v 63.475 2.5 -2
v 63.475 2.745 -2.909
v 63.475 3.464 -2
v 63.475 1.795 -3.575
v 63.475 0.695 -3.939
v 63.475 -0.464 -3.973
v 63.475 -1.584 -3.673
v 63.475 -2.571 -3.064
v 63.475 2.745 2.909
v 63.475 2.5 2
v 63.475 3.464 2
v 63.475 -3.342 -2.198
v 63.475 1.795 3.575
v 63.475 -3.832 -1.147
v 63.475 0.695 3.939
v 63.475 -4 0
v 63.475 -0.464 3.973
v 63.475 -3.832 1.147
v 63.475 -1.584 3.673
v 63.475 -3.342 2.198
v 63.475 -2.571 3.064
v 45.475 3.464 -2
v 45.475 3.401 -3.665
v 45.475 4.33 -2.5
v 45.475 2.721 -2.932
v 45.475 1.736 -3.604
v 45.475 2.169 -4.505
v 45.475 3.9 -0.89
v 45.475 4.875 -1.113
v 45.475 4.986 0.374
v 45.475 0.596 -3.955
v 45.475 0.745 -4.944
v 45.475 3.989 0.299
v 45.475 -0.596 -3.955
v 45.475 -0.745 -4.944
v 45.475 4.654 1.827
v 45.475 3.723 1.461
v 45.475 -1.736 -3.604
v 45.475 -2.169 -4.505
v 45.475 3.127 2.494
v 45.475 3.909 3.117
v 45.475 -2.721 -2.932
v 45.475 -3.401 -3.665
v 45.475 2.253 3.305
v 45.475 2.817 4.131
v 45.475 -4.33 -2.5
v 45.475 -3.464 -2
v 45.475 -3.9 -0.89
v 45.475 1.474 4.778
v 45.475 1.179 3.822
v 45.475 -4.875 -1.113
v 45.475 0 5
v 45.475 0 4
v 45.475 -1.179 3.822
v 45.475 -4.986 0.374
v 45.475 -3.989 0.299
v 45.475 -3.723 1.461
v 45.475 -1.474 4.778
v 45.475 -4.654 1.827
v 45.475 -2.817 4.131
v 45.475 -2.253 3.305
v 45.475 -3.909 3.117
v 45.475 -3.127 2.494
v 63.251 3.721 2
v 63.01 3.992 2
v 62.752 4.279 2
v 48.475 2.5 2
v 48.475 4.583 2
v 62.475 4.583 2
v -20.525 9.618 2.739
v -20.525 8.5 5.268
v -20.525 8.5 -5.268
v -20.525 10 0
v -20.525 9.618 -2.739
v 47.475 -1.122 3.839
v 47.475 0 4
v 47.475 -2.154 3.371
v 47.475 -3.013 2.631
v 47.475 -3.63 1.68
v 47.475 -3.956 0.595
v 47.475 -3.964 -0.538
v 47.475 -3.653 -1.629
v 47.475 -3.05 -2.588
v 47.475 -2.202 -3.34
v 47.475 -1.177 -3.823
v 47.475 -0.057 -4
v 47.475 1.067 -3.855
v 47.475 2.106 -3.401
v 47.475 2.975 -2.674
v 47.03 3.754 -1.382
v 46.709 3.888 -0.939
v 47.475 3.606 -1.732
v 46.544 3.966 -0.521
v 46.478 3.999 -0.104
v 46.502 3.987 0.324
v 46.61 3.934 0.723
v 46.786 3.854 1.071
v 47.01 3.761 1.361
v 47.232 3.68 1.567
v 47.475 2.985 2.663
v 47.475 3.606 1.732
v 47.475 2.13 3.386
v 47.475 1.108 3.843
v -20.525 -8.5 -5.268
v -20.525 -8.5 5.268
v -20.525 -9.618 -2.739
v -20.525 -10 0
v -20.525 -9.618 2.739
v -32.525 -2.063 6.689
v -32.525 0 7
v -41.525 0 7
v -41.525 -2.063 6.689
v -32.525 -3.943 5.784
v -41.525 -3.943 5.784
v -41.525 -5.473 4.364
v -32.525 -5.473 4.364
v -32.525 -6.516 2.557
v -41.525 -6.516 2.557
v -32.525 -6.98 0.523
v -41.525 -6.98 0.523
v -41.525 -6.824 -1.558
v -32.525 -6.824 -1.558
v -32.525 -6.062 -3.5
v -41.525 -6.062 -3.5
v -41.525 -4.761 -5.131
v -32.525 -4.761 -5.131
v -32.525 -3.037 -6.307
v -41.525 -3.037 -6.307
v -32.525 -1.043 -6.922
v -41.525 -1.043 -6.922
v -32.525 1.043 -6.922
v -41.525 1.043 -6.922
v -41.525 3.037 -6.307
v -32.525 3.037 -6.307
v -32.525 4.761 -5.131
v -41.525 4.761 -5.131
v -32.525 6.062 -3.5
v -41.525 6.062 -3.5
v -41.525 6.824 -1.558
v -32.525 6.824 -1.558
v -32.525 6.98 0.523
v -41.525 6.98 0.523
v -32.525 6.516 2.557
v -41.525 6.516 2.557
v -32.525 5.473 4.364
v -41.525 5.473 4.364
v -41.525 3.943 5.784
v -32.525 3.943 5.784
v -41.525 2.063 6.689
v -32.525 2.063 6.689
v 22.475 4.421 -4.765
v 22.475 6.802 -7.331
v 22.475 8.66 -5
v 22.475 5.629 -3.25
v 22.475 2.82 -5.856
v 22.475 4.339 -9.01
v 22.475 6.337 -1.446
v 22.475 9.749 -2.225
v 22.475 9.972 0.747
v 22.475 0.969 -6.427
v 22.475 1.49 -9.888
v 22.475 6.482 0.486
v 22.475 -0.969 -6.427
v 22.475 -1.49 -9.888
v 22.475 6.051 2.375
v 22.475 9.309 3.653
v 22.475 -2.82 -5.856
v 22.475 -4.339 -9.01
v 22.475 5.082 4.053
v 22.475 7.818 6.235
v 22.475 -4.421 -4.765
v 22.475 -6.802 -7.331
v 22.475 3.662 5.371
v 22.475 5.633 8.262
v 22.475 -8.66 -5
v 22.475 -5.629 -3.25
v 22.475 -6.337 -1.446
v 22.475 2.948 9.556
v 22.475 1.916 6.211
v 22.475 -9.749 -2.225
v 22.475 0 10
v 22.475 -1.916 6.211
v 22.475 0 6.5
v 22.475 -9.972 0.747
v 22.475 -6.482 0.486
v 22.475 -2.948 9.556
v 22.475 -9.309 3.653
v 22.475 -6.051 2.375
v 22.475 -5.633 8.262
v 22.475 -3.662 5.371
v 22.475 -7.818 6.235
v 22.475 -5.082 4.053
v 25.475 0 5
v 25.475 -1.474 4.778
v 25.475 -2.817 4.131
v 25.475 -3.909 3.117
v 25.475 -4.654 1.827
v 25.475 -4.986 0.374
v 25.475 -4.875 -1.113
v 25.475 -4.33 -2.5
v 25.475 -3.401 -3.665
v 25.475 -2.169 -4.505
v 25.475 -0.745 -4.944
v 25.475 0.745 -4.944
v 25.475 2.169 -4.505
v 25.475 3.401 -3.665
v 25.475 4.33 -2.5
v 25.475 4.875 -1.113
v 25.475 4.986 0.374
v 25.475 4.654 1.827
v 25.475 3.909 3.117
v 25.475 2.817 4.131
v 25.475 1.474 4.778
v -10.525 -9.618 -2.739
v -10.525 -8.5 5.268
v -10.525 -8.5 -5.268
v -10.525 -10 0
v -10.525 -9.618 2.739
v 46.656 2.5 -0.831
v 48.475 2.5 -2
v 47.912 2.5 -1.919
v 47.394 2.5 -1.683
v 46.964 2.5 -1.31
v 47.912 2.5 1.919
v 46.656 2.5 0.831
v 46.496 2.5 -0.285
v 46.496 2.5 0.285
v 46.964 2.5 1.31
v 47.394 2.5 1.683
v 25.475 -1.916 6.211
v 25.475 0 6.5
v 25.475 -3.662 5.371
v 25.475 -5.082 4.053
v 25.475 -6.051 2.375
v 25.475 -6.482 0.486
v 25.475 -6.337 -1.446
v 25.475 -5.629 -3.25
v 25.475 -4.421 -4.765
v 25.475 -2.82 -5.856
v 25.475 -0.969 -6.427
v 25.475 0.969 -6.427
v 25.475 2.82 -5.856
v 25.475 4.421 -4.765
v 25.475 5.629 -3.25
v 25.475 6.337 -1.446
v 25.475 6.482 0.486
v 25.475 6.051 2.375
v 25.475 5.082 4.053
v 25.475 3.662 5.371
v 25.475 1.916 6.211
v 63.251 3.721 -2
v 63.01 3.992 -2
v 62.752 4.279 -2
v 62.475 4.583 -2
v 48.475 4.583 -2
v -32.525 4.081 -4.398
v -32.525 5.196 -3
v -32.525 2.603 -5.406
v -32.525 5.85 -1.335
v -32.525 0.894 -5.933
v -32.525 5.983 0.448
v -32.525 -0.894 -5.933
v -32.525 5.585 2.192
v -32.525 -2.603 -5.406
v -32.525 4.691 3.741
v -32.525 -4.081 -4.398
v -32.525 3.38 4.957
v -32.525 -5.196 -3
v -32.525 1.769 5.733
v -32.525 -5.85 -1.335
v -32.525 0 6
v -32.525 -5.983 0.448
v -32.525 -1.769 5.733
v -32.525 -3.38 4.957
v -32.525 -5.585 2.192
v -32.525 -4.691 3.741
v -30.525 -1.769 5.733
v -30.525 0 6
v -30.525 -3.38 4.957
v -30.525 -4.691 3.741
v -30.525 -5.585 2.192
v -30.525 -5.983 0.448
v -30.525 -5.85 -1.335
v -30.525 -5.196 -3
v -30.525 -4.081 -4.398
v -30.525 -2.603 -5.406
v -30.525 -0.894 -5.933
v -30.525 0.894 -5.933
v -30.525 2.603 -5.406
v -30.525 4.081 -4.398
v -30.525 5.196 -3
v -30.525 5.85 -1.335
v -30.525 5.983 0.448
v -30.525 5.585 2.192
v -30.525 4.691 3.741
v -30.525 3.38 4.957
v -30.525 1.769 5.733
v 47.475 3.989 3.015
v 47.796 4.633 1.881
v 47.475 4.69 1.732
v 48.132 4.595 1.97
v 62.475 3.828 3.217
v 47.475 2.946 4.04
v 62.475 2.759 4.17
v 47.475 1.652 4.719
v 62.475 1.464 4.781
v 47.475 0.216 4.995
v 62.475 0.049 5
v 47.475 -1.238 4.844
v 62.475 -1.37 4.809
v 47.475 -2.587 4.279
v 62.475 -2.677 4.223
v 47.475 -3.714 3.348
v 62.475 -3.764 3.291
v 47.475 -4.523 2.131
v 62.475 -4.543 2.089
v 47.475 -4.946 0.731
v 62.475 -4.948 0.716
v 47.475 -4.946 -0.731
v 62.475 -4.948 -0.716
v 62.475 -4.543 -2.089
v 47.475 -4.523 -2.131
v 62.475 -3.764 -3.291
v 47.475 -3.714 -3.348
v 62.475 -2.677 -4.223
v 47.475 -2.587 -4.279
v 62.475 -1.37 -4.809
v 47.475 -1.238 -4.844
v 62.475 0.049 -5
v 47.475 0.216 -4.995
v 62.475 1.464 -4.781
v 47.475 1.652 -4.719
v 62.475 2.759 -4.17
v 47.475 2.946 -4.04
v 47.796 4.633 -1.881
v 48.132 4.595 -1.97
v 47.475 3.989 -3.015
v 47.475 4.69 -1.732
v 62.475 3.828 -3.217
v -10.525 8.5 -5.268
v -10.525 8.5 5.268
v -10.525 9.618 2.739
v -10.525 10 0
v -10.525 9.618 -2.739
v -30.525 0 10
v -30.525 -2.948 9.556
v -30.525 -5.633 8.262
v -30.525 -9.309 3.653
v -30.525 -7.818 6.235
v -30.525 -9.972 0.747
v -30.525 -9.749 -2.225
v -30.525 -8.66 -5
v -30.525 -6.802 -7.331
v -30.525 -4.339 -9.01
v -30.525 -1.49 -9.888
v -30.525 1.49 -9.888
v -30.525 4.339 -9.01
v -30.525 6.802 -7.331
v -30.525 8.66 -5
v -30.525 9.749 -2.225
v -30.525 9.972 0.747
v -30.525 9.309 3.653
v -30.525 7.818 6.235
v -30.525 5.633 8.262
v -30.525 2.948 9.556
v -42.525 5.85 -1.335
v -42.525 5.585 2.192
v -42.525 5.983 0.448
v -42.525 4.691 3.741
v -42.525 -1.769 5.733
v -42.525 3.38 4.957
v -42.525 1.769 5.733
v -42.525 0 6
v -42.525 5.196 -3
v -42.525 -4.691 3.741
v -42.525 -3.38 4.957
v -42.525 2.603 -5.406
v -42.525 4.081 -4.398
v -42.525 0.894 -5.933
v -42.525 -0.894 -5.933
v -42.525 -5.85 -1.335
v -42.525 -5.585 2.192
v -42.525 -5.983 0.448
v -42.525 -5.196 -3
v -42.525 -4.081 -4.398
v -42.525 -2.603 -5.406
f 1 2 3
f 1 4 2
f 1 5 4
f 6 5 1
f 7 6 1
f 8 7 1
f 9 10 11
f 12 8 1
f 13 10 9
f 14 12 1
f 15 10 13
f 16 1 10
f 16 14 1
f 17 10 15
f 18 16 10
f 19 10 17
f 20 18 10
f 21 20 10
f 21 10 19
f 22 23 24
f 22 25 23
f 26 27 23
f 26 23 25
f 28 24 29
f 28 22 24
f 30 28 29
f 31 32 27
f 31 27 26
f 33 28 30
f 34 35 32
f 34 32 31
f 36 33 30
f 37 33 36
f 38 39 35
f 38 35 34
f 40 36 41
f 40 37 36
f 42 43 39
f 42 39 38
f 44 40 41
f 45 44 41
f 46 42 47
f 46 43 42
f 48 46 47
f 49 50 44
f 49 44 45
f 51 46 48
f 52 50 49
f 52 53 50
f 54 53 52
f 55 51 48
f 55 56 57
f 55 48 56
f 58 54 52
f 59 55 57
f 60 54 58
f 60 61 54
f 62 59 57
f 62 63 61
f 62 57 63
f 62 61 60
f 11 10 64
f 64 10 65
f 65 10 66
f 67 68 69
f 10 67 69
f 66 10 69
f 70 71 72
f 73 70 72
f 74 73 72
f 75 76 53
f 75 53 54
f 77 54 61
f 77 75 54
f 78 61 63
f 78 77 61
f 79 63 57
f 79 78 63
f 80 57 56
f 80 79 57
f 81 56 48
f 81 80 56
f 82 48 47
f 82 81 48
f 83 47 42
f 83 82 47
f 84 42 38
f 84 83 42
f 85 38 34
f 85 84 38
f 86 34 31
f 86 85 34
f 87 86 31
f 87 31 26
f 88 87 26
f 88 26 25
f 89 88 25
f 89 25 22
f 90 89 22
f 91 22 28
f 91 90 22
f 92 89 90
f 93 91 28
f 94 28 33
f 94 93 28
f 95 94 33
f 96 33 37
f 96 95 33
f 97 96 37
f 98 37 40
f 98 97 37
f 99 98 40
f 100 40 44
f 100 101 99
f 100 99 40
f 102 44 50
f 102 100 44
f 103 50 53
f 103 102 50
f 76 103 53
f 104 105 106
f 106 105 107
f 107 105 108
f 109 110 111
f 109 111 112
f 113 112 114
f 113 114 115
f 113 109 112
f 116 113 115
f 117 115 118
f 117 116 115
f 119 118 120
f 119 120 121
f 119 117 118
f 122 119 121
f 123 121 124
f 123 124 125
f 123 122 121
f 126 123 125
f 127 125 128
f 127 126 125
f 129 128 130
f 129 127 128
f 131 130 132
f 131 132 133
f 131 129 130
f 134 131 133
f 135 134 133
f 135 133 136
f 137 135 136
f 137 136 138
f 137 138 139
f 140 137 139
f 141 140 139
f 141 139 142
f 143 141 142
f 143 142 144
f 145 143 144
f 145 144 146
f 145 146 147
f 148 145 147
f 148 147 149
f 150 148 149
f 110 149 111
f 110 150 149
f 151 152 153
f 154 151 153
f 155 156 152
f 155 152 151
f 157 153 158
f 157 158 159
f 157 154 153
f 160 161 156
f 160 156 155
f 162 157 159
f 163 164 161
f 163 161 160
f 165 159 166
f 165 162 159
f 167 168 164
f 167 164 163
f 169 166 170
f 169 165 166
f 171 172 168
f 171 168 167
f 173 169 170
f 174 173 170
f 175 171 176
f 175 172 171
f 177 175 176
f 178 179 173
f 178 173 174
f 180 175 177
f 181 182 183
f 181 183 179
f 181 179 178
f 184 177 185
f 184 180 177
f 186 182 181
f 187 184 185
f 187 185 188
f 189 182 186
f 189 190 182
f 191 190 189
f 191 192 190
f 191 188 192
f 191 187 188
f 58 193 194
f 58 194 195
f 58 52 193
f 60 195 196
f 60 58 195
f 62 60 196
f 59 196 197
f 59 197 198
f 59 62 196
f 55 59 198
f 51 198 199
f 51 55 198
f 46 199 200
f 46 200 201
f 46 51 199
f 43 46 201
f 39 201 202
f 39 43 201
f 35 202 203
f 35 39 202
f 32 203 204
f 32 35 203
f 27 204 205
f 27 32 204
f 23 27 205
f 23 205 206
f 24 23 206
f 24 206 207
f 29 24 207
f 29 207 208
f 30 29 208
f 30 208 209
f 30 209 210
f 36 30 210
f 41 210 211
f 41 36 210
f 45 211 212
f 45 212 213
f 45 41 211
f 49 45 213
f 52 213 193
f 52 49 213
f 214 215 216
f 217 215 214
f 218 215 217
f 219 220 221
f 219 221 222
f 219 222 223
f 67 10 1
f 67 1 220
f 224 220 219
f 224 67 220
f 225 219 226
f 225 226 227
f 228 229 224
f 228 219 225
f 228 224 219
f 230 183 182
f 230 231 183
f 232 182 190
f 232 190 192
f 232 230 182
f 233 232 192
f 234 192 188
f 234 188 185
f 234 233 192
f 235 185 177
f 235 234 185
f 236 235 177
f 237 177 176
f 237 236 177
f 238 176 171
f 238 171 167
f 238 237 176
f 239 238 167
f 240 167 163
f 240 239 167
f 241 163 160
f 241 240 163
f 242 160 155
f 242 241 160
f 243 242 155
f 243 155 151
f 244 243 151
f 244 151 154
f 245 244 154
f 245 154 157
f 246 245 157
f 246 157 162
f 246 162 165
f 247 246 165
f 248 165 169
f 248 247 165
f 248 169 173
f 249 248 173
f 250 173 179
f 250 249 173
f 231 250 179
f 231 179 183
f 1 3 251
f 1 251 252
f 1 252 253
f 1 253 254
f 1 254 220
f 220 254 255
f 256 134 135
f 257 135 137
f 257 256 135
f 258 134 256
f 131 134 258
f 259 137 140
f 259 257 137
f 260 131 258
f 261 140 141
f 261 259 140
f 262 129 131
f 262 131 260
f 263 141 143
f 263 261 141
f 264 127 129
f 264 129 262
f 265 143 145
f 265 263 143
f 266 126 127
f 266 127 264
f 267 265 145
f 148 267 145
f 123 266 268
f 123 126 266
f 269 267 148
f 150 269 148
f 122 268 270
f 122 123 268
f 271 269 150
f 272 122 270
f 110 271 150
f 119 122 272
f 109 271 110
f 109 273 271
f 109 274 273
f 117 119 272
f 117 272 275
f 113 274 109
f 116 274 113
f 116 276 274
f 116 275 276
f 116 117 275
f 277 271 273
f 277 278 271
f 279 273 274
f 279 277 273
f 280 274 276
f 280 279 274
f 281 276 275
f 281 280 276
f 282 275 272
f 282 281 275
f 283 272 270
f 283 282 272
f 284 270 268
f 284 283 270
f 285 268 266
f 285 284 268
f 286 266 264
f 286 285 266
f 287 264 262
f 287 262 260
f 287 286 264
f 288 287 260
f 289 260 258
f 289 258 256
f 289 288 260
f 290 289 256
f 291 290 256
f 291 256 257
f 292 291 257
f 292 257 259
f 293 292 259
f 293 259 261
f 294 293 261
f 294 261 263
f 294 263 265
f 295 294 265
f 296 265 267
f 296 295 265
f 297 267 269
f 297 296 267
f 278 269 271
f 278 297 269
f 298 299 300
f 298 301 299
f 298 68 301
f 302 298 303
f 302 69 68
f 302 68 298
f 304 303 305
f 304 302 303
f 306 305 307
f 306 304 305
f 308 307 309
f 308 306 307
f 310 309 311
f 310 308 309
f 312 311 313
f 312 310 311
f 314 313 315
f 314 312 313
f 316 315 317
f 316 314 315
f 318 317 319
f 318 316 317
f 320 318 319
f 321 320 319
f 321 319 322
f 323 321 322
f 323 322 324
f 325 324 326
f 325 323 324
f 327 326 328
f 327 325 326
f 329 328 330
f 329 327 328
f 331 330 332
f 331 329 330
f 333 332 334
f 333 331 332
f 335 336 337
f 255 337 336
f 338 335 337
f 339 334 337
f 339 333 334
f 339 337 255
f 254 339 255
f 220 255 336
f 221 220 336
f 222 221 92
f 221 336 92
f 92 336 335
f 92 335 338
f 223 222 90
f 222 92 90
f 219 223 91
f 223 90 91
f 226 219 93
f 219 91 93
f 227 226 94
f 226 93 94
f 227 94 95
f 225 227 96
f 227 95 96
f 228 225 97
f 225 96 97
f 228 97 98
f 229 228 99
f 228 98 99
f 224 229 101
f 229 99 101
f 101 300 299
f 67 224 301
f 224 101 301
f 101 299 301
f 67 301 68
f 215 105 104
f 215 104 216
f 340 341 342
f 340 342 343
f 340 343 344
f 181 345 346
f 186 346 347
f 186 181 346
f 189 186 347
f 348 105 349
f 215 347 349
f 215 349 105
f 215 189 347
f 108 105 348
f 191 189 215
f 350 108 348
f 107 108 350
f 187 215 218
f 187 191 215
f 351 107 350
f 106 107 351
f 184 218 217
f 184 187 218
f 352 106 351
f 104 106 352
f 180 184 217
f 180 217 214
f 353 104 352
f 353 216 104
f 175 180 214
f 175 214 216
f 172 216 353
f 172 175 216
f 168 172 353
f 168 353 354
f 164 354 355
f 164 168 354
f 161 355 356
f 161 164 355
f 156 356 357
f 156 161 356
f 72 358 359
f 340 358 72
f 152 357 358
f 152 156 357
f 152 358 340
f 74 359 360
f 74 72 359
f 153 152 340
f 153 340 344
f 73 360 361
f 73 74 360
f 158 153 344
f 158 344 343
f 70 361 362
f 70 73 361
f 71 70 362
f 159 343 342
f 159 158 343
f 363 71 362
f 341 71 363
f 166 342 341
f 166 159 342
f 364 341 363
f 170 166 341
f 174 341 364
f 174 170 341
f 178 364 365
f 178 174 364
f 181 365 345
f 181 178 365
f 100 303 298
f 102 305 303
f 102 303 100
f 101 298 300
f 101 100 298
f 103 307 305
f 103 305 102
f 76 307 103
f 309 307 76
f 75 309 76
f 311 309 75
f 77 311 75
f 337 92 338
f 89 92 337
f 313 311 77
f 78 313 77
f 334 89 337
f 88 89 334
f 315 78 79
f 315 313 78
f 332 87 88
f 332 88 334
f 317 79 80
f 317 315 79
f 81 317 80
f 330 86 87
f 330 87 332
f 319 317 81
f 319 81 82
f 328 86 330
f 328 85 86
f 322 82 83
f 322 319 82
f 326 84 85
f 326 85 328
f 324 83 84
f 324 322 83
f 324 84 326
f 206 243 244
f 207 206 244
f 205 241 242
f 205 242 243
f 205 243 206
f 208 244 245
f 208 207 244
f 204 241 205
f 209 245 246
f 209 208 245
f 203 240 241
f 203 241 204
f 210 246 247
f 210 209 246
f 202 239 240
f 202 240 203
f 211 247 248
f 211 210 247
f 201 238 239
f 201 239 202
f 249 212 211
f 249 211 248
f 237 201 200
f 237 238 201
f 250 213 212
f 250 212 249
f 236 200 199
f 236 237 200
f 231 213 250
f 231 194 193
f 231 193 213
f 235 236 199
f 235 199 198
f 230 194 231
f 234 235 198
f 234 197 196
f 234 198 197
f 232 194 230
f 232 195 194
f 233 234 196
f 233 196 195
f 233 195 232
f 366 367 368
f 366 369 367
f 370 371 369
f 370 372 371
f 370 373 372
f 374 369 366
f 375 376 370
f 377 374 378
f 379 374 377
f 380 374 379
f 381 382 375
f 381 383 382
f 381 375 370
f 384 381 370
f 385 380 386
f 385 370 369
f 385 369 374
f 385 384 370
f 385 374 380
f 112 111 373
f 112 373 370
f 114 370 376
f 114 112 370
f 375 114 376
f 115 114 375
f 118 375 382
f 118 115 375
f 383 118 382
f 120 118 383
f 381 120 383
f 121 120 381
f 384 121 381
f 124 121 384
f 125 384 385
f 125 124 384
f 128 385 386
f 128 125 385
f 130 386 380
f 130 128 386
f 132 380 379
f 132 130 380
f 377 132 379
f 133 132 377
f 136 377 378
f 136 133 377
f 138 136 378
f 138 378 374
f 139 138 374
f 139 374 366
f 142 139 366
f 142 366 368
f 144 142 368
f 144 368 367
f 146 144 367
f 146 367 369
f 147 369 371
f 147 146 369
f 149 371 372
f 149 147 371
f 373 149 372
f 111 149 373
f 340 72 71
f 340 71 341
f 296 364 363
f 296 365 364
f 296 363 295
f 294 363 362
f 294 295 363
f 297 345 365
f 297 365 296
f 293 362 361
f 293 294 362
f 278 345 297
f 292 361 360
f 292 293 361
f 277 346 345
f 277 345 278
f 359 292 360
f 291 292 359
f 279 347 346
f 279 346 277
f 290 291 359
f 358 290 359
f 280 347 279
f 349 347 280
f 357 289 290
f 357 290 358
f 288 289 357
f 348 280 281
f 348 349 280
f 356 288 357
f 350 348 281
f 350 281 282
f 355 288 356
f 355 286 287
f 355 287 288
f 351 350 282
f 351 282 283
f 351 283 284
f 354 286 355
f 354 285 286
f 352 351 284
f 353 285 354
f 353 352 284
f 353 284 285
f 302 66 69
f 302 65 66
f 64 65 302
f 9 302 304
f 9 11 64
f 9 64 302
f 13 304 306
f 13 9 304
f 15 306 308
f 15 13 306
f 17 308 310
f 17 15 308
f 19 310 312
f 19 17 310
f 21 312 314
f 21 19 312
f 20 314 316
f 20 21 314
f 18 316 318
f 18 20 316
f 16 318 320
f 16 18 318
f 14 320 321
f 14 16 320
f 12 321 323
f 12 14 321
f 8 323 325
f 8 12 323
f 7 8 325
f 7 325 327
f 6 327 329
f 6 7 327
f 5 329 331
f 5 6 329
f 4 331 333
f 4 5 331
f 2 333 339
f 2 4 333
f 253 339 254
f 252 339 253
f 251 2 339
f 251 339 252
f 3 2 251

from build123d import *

# Parameters (mm, degrees)
CHAMFER_1_SIZE      = 1
SKETCH_2_W          = 10
SKETCH_2_H          = 3.47339454
SKETCH_2_H_2        = 3.228485256
CUT_EXTRUDE_1_DEPTH = 15
CUT_EXTRUDE_2_DEPTH = 2.5


with BuildPart() as part:
    # 草图1 → 旋转1 (revolve)
    with BuildSketch(Plane.XY, mode=Mode.PRIVATE) as revolve_1_sk:
        Polygon((-42.524834638, 0), (-42.524834638, 7), (-32.524834638, 7), (-32.524834638, 6), (-30.524834638, 6), (-30.524834638, 10), (22.475165362, 10), (22.475165362, 6.5), (25.475165362, 6.5), (25.475165362, 5), (45.475165362, 5), (45.475165362, 4), (47.475165362, 4), (47.475165362, 5), (63.475165362, 5), (63.475165362, 0), align=None)
    revolve(revolve_1_sk.sketch.rotate(Axis((-49.06711689, 0, 0), (1, 0, 0)), 90), axis=Axis((-49.06711689, 0, 0), (1, 0, 0)))

    # 倒角1
    chamfer_1_edges = [part.edges().sort_by_distance(p)[0] for p in [
        (63.475165362, 0, -5),
        (-42.524834638, 0, -7),
    ]]
    chamfer(chamfer_1_edges, length=CHAMFER_1_SIZE)

    # 草图2 → 拉伸1 (cut, symmetric)
    with BuildSketch(Plane.XY):
        with Locations((-15.524834638, 10.23669727)):
            Rectangle(SKETCH_2_W, SKETCH_2_H)
        with Locations((-15.524834638, -10.114242628)):
            Rectangle(SKETCH_2_W, SKETCH_2_H_2)
    extrude(amount=CUT_EXTRUDE_1_DEPTH, both=True, mode=Mode.SUBTRACT)

    # 草图3 → 拉伸2 (cut)
    with BuildSketch(Plane(origin=(0, 5, 0), x_dir=(-1, 0, 0), z_dir=(0, 1, 0))):
        with BuildLine():
            Line((-48.475165362, 2), (-63.475165362, 2))
            Line((-63.475165362, 2), (-63.475165362, -2))
            Line((-63.475165362, -2), (-48.475165362, -2))
            ThreePointArc((-48.475165362, -2), (-46.475165362, 0), (-48.475165362, 2))
        make_face()
    extrude(amount=-CUT_EXTRUDE_2_DEPTH, mode=Mode.SUBTRACT)


solid = part.part
